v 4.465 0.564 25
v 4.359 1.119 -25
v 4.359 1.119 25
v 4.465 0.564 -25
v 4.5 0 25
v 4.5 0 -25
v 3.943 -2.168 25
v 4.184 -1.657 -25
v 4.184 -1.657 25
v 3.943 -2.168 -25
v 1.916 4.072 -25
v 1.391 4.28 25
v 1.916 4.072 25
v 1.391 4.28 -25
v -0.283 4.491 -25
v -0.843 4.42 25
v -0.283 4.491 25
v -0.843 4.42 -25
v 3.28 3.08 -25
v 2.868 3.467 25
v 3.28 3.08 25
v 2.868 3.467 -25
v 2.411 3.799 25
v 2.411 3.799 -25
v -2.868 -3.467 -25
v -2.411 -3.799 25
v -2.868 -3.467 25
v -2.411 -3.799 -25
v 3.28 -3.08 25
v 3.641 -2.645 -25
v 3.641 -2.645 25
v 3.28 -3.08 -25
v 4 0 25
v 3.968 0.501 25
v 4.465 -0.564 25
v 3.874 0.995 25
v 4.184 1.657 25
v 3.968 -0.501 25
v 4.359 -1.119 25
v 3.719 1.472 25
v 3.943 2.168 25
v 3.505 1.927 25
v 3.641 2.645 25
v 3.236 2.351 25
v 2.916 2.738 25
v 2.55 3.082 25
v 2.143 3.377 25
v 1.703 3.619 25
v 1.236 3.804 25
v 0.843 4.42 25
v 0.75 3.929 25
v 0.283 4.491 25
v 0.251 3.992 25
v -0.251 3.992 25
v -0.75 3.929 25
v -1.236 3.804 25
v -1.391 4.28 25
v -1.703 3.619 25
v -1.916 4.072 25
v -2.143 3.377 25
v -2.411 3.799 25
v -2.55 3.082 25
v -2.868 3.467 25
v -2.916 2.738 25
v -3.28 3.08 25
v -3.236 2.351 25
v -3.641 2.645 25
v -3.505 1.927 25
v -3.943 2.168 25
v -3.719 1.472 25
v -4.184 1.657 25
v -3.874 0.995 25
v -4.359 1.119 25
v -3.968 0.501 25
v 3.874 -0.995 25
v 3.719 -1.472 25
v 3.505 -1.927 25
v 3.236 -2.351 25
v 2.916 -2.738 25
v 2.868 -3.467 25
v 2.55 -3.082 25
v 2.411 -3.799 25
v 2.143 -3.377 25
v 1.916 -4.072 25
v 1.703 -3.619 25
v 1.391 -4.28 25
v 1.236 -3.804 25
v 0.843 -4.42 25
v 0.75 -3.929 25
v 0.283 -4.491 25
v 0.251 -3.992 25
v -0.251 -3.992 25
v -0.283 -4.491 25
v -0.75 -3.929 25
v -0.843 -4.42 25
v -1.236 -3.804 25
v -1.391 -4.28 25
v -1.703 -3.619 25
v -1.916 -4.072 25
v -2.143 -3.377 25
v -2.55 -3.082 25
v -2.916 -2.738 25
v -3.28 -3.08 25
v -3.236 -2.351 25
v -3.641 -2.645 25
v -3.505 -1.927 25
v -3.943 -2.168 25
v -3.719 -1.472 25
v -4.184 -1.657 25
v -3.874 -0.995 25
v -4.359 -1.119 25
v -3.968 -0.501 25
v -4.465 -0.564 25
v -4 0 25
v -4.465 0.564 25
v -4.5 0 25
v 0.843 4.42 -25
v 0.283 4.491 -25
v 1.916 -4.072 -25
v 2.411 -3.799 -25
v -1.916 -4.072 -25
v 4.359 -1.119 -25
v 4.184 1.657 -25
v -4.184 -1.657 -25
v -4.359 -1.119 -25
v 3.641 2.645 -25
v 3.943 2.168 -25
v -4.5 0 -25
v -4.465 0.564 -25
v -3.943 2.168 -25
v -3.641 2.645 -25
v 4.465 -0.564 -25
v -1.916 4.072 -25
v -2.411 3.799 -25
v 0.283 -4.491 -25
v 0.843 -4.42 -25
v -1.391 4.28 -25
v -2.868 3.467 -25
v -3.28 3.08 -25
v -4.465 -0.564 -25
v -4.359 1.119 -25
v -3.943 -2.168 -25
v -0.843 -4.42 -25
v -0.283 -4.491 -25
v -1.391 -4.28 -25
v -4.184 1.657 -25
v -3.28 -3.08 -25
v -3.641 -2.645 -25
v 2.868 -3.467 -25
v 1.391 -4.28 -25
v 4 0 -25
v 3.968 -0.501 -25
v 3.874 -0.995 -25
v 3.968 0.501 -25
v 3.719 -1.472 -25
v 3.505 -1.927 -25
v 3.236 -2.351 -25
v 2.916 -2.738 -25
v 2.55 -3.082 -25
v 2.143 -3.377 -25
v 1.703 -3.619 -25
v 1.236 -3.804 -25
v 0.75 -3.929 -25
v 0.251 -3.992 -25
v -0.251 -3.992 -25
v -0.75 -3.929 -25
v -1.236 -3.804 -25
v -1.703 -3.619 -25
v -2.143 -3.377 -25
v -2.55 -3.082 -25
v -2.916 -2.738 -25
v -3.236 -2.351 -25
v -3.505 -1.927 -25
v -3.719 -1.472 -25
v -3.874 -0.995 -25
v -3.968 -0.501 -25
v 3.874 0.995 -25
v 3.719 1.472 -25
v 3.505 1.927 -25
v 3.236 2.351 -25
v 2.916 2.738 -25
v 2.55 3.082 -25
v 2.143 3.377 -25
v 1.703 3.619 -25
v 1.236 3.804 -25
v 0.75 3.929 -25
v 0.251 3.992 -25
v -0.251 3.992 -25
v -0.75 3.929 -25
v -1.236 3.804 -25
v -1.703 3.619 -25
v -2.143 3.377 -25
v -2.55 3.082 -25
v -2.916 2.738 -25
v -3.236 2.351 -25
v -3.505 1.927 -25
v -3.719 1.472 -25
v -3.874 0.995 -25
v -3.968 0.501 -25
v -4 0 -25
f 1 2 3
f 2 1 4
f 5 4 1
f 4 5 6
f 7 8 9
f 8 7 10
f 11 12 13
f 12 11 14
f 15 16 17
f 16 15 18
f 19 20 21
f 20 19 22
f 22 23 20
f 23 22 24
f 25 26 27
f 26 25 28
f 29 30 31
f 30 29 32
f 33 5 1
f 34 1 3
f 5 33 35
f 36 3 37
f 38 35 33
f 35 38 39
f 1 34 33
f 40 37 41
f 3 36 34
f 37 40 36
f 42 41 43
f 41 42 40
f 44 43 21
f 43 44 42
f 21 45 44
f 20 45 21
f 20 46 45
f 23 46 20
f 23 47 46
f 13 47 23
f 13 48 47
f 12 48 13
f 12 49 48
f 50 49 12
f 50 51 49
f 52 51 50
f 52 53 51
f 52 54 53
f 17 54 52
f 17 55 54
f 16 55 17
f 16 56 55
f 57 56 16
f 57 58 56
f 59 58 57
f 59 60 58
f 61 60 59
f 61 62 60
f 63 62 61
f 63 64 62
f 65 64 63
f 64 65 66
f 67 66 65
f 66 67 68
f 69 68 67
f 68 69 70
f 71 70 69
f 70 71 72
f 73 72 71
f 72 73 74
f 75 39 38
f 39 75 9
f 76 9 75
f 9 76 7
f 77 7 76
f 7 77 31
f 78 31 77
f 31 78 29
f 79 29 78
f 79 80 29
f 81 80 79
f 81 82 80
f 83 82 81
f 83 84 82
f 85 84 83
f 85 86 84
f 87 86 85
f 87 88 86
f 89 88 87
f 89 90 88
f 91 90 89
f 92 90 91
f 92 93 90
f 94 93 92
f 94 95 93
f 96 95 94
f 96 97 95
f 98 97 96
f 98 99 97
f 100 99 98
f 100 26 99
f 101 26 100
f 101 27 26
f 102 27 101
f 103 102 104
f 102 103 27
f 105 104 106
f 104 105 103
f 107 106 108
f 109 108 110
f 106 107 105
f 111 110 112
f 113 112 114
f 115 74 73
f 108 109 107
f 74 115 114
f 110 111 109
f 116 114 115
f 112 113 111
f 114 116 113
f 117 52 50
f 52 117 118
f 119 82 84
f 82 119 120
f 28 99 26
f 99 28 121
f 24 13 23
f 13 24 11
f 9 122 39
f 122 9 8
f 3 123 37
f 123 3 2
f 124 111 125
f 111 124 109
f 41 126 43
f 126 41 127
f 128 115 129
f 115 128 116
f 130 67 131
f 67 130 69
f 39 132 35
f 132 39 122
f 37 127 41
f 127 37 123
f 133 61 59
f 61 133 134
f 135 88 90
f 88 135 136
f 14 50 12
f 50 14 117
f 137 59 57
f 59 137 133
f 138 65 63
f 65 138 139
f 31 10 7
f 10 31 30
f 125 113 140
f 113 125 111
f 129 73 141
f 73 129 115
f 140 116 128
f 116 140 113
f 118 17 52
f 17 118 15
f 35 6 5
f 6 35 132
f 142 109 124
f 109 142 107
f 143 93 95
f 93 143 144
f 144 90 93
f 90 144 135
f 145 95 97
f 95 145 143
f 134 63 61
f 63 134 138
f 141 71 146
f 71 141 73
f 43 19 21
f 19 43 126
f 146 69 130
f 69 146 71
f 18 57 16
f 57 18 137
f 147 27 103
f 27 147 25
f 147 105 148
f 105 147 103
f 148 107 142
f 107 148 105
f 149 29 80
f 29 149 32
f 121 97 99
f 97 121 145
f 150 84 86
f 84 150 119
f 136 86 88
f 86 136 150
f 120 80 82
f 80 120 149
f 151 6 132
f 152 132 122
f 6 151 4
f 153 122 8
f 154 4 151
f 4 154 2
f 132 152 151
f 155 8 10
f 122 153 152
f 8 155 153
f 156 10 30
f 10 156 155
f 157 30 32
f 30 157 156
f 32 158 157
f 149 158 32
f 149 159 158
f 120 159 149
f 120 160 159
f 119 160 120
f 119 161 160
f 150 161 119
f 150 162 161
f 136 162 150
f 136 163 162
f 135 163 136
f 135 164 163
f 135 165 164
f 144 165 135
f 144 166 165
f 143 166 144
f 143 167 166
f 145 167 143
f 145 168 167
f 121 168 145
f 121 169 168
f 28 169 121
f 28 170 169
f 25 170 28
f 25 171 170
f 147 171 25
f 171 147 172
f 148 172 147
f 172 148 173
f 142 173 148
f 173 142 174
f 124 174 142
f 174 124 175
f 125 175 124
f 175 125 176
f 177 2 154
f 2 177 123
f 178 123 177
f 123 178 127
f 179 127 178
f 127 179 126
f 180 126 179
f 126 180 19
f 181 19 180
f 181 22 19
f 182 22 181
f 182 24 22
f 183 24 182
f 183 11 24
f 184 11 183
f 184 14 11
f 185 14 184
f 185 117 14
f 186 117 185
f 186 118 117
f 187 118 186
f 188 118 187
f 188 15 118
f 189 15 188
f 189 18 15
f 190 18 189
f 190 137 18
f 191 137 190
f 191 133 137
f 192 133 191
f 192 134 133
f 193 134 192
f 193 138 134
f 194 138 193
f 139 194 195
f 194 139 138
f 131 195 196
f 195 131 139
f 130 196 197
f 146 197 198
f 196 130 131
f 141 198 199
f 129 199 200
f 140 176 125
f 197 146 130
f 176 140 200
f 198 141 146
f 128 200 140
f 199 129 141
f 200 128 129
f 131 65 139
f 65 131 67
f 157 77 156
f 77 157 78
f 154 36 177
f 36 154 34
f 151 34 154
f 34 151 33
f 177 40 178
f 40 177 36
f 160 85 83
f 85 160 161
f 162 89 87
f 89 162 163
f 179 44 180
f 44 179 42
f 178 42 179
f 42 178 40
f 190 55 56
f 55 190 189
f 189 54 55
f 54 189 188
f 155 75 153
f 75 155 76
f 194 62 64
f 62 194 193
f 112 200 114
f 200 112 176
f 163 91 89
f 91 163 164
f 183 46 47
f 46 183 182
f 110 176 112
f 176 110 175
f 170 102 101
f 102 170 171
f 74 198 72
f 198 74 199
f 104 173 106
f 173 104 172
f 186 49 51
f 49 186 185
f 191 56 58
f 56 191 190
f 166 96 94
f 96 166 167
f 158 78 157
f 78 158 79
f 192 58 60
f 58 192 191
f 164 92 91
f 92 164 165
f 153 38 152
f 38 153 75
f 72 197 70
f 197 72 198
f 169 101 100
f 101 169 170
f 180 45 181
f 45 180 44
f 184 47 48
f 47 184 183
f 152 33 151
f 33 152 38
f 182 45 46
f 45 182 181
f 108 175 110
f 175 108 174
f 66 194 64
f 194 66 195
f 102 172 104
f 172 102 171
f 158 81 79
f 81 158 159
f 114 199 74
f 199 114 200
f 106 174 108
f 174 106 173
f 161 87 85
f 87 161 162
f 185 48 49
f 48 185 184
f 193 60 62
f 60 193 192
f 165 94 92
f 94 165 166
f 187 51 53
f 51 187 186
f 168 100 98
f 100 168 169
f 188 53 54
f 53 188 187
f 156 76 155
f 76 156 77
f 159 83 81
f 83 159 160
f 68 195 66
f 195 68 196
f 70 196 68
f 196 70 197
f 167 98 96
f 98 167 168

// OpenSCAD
$fn = 50;


difference() {
	union() {
		translate(v = [0, 0, -25.0000000000]) {
			cylinder(h = 50, r = 4.5000000000);
		}
	}
	union() {
		translate(v = [0, 0, -100.0000000000]) {
			cylinder(h = 200, r = 4.0000000000);
		}
	}
}
